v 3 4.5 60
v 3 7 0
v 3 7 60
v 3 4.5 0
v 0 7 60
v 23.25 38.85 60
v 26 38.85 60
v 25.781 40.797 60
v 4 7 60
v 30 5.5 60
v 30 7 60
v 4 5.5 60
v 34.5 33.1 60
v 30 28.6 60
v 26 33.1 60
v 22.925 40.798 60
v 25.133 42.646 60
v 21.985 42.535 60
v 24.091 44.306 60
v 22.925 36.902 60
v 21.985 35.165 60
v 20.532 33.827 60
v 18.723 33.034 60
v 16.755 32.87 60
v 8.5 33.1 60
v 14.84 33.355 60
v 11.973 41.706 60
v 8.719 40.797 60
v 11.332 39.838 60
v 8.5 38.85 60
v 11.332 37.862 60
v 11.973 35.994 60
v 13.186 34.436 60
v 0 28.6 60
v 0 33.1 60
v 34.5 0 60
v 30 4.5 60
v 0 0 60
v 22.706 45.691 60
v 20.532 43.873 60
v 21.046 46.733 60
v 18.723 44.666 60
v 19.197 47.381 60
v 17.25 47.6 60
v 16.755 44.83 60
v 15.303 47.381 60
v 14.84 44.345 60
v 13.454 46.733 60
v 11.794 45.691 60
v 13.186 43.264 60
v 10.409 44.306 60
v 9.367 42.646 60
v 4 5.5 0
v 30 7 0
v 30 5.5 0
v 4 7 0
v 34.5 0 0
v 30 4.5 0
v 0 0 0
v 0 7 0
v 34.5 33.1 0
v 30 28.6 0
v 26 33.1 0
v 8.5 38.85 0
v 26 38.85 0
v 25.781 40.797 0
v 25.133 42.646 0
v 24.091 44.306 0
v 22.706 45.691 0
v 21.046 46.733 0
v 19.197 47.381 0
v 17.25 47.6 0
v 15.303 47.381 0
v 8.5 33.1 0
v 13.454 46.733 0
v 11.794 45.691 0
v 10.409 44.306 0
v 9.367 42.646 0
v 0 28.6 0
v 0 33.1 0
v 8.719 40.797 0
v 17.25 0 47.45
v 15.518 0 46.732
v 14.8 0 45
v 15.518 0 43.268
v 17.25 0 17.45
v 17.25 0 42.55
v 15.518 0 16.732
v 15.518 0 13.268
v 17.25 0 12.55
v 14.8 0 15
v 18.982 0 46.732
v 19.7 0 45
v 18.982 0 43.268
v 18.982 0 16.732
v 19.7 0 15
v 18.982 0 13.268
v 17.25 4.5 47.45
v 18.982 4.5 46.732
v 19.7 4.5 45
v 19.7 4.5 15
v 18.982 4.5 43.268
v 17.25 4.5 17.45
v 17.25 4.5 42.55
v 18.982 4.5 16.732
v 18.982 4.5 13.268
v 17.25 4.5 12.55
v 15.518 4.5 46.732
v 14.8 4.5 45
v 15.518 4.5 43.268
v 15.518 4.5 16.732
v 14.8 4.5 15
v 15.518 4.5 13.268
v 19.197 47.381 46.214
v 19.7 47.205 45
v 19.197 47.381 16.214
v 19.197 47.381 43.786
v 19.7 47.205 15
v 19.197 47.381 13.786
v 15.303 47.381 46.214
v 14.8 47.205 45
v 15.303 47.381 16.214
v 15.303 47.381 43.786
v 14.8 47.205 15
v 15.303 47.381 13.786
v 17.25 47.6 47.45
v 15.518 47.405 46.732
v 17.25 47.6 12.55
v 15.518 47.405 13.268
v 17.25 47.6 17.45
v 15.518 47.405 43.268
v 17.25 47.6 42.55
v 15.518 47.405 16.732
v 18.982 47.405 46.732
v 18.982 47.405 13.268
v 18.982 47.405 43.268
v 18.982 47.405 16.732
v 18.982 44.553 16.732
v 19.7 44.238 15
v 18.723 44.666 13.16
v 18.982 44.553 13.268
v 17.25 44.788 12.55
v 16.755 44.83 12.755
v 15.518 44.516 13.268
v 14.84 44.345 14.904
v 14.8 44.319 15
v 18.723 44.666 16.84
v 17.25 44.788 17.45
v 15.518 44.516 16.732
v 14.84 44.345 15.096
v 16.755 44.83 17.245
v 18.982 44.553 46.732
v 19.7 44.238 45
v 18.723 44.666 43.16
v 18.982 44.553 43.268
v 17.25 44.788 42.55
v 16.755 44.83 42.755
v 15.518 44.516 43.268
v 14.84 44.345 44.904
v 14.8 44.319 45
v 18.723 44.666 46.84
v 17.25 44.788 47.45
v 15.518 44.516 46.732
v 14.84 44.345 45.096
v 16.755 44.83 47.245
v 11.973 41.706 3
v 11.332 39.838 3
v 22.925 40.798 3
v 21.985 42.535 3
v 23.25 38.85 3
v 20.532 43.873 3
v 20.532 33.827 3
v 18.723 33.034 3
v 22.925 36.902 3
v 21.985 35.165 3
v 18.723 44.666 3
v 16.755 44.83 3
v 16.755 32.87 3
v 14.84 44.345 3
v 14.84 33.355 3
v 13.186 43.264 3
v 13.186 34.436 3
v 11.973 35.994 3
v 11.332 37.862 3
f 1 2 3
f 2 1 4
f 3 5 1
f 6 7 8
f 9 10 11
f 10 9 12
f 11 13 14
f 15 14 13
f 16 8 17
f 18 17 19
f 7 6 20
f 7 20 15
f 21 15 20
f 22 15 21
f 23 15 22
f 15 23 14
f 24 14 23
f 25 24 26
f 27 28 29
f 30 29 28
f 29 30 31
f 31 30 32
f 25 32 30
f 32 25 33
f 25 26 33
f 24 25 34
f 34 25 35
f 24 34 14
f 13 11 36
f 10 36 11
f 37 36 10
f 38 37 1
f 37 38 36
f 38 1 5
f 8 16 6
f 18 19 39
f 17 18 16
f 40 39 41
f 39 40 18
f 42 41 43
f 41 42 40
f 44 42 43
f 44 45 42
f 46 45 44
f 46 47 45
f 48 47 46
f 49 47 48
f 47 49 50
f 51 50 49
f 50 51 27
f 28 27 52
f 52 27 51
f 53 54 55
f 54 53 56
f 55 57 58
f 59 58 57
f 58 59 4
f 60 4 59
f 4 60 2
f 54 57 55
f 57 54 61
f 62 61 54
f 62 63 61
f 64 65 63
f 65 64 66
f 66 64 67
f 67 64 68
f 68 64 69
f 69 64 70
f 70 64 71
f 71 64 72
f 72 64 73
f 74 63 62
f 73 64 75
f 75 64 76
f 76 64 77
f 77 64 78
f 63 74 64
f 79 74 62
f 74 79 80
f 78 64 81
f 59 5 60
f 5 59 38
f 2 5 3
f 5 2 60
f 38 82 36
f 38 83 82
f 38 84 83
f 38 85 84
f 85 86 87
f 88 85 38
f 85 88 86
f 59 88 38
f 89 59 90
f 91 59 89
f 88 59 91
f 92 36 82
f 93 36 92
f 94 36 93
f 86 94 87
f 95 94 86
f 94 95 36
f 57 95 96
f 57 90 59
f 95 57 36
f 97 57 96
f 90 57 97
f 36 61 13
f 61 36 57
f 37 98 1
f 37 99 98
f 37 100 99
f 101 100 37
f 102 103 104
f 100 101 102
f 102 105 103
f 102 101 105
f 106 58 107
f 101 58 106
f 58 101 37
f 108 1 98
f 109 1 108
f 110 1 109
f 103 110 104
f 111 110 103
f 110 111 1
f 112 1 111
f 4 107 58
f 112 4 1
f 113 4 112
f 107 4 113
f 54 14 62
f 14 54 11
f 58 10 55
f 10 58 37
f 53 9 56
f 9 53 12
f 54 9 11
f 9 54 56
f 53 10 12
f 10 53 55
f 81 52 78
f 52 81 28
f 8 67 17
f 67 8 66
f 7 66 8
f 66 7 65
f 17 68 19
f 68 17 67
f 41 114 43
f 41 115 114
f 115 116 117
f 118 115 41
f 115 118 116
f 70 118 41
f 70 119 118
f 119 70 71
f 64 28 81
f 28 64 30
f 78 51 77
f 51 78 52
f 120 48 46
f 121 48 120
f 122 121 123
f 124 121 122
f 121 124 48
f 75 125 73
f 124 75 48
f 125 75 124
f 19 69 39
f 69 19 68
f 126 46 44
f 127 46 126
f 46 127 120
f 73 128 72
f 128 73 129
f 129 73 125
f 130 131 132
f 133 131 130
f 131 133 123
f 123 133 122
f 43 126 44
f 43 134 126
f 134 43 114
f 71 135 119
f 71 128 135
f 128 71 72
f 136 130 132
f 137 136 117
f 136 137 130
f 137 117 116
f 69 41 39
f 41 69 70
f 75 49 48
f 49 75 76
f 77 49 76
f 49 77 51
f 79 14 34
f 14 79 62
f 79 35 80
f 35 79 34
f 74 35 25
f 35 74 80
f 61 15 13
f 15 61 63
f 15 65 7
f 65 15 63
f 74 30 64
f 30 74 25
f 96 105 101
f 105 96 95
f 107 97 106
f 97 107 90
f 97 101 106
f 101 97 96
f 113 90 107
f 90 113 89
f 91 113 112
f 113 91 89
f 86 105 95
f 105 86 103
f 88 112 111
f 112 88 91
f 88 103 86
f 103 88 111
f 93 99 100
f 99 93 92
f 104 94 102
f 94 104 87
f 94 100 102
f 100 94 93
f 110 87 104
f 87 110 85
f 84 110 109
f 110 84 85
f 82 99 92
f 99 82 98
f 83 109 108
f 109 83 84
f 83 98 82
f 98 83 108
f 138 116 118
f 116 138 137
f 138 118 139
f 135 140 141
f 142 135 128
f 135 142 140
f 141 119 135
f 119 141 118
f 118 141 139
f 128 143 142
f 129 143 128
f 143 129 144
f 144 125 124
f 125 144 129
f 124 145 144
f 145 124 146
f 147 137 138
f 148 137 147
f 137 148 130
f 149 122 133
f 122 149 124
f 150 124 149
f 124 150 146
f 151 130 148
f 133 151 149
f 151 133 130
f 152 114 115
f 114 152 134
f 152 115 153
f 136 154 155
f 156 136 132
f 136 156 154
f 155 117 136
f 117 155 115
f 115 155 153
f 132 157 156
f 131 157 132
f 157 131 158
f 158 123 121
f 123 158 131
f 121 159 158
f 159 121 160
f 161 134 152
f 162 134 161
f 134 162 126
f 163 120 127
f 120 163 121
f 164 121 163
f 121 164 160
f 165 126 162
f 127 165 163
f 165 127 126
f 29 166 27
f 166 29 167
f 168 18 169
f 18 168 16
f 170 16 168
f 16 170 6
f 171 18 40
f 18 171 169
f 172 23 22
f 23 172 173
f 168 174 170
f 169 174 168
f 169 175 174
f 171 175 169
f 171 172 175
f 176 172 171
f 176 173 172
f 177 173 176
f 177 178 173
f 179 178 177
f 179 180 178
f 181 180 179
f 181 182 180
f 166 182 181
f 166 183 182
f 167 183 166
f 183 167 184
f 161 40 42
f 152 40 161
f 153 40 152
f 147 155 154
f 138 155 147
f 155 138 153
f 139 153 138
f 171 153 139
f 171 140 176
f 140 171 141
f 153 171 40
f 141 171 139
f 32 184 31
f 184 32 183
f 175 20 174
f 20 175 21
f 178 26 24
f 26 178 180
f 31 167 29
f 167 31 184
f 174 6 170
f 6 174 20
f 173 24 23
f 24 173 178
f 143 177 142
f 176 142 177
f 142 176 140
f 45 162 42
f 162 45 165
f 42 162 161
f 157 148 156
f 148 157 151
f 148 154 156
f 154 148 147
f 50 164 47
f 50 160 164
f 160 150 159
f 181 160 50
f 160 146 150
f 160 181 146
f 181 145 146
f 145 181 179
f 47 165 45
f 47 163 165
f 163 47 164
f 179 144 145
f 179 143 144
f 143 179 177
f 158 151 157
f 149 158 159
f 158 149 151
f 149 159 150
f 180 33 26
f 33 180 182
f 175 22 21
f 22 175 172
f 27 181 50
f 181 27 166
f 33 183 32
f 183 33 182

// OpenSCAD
//default profile thickness
t=3;
//Diameter of rod to be held
d=11.5;
//extra clearance to be provided to account for thicker than design extrusions (to make up for 3D printer tolerances). This is applied as an extra clearance on all internal openings including screw holes.
clearance=0.25;
//Length of top and bottom sides of the C shaped clamp
l=30;
//Width between the top and bottom sides of the C shaped clamp. i.e. the thickness of the wall/plate/etc to which the bracket is being clamped.
w=21.6;
//Height of the clamp and rod holder. A short clamp will only have 1 screw hole, a long clamp will have 3.
h=60;
//Diameter of the screws (bolts) to be used to pressure the clamp
Dscrew=5;
//thickening factor applied to strengthen the bracket. The higher the factor, the stronger the clamp will be able to be tightened.
n=1.5;



difference() {

union(){ //start solids group
cube([t,n*t+4*clearance+t/2,h]);

cube([l+n*t,n*t,h]);

translate([t+4*clearance,n*t+4*clearance,0]) {
  cube([l-t-4*clearance,t/2,h]);
}

translate([(l+n*t)/2,n*t+4*clearance+t/2+w+n*t+d/2,0]) {
  cylinder(h = h, d=d+2*t);
}

translate([l,n*t,0]) {
  cube([n*t,4*clearance+t/2+w,h]);
}

translate([0,n*t+4*clearance+t/2+w,0]) {
  cube([l+n*t,n*t,h]);
}
translate([(l+n*t-(d+2*t))/2,n*t+4*clearance+t/2+w,0]) {
  cube([d+2*t,d/2+n*t,h]);
}

}//end solids group




union(){//start cut group

translate([(l+n*t)/2,n*t+4*clearance+t/2+w+n*t+d/2,t]) {
  cylinder(h = h-t, d=d+2*clearance);}
}


if(h>=15*Dscrew){
translate([(l+n*t)/2,0,0.25*h]) {
	rotate([-90,0,0]){
	  cylinder(h = n*t, d=Dscrew-0.6+2*clearance);}
	}
translate([(l+n*t)/2,0,0.5*h]) {
	rotate([-90,0,0]){
	  cylinder(h = n*t, d=Dscrew-0.6+2*clearance);}
	}
translate([(l+n*t)/2,0,0.75*h]) {
	rotate([-90,0,0]){
	  cylinder(h = n*t, d=Dscrew-0.6+2*clearance);}
	}
}else if(h>=10*Dscrew){
translate([(l+n*t)/2,0,0.25*h]) {
	rotate([-90,0,0]){
	  cylinder(h = n*t, d=Dscrew-0.6+2*clearance);}
	}
translate([(l+n*t)/2,0,0.75*h]) {
	rotate([-90,0,0]){
	  cylinder(h = n*t, d=Dscrew-0.6+2*clearance);}
	}
}else if(h>=2.5*Dscrew){
translate([(l+n*t)/2,0,h/2]) {
	rotate([-90,0,0]){
	  cylinder(h = n*t, d=Dscrew-0.6+2*clearance);}
	}
}


if(h>=15*Dscrew){
translate([(l+n*t)/2,n*t+4*clearance+t/2+w+n*t+d/2,0.25*h]) {
	rotate([-90,0,0]){
	  cylinder(h = t+d, d=Dscrew-0.6+2*clearance);}
	}
translate([(l+n*t)/2,n*t+4*clearance+t/2+w+n*t+d/2,0.5*h]) {
	rotate([-90,0,0]){
	  cylinder(h = t+d, d=Dscrew-0.6+2*clearance);}
	}
translate([(l+n*t)/2,n*t+4*clearance+t/2+w+n*t+d/2,0.75*h]) {
	rotate([-90,0,0]){
	  cylinder(h = t+d, d=Dscrew-0.6+2*clearance);}
	}
}else if(h>=10*Dscrew){
translate([(l+n*t)/2,n*t+4*clearance+t/2+w+n*t+d/2,0.25*h]) {
	rotate([-90,0,0]){
	  cylinder(h = t+d, d=Dscrew-0.6+2*clearance);}
	}
translate([(l+n*t)/2,n*t+4*clearance+t/2+w+n*t+d/2,0.75*h]) {
	rotate([-90,0,0]){
	  cylinder(h = t+d, d=Dscrew-0.6+2*clearance);}
	}
}else if(h>=2.5*Dscrew){
translate([(l+n*t)/2,n*t+4*clearance+t/2+w+n*t+d/2,h/2]) {
	rotate([-90,0,0]){
	  cylinder(h = t+d, d=Dscrew-0.6+2*clearance);}
	}
}

}//end cut group
